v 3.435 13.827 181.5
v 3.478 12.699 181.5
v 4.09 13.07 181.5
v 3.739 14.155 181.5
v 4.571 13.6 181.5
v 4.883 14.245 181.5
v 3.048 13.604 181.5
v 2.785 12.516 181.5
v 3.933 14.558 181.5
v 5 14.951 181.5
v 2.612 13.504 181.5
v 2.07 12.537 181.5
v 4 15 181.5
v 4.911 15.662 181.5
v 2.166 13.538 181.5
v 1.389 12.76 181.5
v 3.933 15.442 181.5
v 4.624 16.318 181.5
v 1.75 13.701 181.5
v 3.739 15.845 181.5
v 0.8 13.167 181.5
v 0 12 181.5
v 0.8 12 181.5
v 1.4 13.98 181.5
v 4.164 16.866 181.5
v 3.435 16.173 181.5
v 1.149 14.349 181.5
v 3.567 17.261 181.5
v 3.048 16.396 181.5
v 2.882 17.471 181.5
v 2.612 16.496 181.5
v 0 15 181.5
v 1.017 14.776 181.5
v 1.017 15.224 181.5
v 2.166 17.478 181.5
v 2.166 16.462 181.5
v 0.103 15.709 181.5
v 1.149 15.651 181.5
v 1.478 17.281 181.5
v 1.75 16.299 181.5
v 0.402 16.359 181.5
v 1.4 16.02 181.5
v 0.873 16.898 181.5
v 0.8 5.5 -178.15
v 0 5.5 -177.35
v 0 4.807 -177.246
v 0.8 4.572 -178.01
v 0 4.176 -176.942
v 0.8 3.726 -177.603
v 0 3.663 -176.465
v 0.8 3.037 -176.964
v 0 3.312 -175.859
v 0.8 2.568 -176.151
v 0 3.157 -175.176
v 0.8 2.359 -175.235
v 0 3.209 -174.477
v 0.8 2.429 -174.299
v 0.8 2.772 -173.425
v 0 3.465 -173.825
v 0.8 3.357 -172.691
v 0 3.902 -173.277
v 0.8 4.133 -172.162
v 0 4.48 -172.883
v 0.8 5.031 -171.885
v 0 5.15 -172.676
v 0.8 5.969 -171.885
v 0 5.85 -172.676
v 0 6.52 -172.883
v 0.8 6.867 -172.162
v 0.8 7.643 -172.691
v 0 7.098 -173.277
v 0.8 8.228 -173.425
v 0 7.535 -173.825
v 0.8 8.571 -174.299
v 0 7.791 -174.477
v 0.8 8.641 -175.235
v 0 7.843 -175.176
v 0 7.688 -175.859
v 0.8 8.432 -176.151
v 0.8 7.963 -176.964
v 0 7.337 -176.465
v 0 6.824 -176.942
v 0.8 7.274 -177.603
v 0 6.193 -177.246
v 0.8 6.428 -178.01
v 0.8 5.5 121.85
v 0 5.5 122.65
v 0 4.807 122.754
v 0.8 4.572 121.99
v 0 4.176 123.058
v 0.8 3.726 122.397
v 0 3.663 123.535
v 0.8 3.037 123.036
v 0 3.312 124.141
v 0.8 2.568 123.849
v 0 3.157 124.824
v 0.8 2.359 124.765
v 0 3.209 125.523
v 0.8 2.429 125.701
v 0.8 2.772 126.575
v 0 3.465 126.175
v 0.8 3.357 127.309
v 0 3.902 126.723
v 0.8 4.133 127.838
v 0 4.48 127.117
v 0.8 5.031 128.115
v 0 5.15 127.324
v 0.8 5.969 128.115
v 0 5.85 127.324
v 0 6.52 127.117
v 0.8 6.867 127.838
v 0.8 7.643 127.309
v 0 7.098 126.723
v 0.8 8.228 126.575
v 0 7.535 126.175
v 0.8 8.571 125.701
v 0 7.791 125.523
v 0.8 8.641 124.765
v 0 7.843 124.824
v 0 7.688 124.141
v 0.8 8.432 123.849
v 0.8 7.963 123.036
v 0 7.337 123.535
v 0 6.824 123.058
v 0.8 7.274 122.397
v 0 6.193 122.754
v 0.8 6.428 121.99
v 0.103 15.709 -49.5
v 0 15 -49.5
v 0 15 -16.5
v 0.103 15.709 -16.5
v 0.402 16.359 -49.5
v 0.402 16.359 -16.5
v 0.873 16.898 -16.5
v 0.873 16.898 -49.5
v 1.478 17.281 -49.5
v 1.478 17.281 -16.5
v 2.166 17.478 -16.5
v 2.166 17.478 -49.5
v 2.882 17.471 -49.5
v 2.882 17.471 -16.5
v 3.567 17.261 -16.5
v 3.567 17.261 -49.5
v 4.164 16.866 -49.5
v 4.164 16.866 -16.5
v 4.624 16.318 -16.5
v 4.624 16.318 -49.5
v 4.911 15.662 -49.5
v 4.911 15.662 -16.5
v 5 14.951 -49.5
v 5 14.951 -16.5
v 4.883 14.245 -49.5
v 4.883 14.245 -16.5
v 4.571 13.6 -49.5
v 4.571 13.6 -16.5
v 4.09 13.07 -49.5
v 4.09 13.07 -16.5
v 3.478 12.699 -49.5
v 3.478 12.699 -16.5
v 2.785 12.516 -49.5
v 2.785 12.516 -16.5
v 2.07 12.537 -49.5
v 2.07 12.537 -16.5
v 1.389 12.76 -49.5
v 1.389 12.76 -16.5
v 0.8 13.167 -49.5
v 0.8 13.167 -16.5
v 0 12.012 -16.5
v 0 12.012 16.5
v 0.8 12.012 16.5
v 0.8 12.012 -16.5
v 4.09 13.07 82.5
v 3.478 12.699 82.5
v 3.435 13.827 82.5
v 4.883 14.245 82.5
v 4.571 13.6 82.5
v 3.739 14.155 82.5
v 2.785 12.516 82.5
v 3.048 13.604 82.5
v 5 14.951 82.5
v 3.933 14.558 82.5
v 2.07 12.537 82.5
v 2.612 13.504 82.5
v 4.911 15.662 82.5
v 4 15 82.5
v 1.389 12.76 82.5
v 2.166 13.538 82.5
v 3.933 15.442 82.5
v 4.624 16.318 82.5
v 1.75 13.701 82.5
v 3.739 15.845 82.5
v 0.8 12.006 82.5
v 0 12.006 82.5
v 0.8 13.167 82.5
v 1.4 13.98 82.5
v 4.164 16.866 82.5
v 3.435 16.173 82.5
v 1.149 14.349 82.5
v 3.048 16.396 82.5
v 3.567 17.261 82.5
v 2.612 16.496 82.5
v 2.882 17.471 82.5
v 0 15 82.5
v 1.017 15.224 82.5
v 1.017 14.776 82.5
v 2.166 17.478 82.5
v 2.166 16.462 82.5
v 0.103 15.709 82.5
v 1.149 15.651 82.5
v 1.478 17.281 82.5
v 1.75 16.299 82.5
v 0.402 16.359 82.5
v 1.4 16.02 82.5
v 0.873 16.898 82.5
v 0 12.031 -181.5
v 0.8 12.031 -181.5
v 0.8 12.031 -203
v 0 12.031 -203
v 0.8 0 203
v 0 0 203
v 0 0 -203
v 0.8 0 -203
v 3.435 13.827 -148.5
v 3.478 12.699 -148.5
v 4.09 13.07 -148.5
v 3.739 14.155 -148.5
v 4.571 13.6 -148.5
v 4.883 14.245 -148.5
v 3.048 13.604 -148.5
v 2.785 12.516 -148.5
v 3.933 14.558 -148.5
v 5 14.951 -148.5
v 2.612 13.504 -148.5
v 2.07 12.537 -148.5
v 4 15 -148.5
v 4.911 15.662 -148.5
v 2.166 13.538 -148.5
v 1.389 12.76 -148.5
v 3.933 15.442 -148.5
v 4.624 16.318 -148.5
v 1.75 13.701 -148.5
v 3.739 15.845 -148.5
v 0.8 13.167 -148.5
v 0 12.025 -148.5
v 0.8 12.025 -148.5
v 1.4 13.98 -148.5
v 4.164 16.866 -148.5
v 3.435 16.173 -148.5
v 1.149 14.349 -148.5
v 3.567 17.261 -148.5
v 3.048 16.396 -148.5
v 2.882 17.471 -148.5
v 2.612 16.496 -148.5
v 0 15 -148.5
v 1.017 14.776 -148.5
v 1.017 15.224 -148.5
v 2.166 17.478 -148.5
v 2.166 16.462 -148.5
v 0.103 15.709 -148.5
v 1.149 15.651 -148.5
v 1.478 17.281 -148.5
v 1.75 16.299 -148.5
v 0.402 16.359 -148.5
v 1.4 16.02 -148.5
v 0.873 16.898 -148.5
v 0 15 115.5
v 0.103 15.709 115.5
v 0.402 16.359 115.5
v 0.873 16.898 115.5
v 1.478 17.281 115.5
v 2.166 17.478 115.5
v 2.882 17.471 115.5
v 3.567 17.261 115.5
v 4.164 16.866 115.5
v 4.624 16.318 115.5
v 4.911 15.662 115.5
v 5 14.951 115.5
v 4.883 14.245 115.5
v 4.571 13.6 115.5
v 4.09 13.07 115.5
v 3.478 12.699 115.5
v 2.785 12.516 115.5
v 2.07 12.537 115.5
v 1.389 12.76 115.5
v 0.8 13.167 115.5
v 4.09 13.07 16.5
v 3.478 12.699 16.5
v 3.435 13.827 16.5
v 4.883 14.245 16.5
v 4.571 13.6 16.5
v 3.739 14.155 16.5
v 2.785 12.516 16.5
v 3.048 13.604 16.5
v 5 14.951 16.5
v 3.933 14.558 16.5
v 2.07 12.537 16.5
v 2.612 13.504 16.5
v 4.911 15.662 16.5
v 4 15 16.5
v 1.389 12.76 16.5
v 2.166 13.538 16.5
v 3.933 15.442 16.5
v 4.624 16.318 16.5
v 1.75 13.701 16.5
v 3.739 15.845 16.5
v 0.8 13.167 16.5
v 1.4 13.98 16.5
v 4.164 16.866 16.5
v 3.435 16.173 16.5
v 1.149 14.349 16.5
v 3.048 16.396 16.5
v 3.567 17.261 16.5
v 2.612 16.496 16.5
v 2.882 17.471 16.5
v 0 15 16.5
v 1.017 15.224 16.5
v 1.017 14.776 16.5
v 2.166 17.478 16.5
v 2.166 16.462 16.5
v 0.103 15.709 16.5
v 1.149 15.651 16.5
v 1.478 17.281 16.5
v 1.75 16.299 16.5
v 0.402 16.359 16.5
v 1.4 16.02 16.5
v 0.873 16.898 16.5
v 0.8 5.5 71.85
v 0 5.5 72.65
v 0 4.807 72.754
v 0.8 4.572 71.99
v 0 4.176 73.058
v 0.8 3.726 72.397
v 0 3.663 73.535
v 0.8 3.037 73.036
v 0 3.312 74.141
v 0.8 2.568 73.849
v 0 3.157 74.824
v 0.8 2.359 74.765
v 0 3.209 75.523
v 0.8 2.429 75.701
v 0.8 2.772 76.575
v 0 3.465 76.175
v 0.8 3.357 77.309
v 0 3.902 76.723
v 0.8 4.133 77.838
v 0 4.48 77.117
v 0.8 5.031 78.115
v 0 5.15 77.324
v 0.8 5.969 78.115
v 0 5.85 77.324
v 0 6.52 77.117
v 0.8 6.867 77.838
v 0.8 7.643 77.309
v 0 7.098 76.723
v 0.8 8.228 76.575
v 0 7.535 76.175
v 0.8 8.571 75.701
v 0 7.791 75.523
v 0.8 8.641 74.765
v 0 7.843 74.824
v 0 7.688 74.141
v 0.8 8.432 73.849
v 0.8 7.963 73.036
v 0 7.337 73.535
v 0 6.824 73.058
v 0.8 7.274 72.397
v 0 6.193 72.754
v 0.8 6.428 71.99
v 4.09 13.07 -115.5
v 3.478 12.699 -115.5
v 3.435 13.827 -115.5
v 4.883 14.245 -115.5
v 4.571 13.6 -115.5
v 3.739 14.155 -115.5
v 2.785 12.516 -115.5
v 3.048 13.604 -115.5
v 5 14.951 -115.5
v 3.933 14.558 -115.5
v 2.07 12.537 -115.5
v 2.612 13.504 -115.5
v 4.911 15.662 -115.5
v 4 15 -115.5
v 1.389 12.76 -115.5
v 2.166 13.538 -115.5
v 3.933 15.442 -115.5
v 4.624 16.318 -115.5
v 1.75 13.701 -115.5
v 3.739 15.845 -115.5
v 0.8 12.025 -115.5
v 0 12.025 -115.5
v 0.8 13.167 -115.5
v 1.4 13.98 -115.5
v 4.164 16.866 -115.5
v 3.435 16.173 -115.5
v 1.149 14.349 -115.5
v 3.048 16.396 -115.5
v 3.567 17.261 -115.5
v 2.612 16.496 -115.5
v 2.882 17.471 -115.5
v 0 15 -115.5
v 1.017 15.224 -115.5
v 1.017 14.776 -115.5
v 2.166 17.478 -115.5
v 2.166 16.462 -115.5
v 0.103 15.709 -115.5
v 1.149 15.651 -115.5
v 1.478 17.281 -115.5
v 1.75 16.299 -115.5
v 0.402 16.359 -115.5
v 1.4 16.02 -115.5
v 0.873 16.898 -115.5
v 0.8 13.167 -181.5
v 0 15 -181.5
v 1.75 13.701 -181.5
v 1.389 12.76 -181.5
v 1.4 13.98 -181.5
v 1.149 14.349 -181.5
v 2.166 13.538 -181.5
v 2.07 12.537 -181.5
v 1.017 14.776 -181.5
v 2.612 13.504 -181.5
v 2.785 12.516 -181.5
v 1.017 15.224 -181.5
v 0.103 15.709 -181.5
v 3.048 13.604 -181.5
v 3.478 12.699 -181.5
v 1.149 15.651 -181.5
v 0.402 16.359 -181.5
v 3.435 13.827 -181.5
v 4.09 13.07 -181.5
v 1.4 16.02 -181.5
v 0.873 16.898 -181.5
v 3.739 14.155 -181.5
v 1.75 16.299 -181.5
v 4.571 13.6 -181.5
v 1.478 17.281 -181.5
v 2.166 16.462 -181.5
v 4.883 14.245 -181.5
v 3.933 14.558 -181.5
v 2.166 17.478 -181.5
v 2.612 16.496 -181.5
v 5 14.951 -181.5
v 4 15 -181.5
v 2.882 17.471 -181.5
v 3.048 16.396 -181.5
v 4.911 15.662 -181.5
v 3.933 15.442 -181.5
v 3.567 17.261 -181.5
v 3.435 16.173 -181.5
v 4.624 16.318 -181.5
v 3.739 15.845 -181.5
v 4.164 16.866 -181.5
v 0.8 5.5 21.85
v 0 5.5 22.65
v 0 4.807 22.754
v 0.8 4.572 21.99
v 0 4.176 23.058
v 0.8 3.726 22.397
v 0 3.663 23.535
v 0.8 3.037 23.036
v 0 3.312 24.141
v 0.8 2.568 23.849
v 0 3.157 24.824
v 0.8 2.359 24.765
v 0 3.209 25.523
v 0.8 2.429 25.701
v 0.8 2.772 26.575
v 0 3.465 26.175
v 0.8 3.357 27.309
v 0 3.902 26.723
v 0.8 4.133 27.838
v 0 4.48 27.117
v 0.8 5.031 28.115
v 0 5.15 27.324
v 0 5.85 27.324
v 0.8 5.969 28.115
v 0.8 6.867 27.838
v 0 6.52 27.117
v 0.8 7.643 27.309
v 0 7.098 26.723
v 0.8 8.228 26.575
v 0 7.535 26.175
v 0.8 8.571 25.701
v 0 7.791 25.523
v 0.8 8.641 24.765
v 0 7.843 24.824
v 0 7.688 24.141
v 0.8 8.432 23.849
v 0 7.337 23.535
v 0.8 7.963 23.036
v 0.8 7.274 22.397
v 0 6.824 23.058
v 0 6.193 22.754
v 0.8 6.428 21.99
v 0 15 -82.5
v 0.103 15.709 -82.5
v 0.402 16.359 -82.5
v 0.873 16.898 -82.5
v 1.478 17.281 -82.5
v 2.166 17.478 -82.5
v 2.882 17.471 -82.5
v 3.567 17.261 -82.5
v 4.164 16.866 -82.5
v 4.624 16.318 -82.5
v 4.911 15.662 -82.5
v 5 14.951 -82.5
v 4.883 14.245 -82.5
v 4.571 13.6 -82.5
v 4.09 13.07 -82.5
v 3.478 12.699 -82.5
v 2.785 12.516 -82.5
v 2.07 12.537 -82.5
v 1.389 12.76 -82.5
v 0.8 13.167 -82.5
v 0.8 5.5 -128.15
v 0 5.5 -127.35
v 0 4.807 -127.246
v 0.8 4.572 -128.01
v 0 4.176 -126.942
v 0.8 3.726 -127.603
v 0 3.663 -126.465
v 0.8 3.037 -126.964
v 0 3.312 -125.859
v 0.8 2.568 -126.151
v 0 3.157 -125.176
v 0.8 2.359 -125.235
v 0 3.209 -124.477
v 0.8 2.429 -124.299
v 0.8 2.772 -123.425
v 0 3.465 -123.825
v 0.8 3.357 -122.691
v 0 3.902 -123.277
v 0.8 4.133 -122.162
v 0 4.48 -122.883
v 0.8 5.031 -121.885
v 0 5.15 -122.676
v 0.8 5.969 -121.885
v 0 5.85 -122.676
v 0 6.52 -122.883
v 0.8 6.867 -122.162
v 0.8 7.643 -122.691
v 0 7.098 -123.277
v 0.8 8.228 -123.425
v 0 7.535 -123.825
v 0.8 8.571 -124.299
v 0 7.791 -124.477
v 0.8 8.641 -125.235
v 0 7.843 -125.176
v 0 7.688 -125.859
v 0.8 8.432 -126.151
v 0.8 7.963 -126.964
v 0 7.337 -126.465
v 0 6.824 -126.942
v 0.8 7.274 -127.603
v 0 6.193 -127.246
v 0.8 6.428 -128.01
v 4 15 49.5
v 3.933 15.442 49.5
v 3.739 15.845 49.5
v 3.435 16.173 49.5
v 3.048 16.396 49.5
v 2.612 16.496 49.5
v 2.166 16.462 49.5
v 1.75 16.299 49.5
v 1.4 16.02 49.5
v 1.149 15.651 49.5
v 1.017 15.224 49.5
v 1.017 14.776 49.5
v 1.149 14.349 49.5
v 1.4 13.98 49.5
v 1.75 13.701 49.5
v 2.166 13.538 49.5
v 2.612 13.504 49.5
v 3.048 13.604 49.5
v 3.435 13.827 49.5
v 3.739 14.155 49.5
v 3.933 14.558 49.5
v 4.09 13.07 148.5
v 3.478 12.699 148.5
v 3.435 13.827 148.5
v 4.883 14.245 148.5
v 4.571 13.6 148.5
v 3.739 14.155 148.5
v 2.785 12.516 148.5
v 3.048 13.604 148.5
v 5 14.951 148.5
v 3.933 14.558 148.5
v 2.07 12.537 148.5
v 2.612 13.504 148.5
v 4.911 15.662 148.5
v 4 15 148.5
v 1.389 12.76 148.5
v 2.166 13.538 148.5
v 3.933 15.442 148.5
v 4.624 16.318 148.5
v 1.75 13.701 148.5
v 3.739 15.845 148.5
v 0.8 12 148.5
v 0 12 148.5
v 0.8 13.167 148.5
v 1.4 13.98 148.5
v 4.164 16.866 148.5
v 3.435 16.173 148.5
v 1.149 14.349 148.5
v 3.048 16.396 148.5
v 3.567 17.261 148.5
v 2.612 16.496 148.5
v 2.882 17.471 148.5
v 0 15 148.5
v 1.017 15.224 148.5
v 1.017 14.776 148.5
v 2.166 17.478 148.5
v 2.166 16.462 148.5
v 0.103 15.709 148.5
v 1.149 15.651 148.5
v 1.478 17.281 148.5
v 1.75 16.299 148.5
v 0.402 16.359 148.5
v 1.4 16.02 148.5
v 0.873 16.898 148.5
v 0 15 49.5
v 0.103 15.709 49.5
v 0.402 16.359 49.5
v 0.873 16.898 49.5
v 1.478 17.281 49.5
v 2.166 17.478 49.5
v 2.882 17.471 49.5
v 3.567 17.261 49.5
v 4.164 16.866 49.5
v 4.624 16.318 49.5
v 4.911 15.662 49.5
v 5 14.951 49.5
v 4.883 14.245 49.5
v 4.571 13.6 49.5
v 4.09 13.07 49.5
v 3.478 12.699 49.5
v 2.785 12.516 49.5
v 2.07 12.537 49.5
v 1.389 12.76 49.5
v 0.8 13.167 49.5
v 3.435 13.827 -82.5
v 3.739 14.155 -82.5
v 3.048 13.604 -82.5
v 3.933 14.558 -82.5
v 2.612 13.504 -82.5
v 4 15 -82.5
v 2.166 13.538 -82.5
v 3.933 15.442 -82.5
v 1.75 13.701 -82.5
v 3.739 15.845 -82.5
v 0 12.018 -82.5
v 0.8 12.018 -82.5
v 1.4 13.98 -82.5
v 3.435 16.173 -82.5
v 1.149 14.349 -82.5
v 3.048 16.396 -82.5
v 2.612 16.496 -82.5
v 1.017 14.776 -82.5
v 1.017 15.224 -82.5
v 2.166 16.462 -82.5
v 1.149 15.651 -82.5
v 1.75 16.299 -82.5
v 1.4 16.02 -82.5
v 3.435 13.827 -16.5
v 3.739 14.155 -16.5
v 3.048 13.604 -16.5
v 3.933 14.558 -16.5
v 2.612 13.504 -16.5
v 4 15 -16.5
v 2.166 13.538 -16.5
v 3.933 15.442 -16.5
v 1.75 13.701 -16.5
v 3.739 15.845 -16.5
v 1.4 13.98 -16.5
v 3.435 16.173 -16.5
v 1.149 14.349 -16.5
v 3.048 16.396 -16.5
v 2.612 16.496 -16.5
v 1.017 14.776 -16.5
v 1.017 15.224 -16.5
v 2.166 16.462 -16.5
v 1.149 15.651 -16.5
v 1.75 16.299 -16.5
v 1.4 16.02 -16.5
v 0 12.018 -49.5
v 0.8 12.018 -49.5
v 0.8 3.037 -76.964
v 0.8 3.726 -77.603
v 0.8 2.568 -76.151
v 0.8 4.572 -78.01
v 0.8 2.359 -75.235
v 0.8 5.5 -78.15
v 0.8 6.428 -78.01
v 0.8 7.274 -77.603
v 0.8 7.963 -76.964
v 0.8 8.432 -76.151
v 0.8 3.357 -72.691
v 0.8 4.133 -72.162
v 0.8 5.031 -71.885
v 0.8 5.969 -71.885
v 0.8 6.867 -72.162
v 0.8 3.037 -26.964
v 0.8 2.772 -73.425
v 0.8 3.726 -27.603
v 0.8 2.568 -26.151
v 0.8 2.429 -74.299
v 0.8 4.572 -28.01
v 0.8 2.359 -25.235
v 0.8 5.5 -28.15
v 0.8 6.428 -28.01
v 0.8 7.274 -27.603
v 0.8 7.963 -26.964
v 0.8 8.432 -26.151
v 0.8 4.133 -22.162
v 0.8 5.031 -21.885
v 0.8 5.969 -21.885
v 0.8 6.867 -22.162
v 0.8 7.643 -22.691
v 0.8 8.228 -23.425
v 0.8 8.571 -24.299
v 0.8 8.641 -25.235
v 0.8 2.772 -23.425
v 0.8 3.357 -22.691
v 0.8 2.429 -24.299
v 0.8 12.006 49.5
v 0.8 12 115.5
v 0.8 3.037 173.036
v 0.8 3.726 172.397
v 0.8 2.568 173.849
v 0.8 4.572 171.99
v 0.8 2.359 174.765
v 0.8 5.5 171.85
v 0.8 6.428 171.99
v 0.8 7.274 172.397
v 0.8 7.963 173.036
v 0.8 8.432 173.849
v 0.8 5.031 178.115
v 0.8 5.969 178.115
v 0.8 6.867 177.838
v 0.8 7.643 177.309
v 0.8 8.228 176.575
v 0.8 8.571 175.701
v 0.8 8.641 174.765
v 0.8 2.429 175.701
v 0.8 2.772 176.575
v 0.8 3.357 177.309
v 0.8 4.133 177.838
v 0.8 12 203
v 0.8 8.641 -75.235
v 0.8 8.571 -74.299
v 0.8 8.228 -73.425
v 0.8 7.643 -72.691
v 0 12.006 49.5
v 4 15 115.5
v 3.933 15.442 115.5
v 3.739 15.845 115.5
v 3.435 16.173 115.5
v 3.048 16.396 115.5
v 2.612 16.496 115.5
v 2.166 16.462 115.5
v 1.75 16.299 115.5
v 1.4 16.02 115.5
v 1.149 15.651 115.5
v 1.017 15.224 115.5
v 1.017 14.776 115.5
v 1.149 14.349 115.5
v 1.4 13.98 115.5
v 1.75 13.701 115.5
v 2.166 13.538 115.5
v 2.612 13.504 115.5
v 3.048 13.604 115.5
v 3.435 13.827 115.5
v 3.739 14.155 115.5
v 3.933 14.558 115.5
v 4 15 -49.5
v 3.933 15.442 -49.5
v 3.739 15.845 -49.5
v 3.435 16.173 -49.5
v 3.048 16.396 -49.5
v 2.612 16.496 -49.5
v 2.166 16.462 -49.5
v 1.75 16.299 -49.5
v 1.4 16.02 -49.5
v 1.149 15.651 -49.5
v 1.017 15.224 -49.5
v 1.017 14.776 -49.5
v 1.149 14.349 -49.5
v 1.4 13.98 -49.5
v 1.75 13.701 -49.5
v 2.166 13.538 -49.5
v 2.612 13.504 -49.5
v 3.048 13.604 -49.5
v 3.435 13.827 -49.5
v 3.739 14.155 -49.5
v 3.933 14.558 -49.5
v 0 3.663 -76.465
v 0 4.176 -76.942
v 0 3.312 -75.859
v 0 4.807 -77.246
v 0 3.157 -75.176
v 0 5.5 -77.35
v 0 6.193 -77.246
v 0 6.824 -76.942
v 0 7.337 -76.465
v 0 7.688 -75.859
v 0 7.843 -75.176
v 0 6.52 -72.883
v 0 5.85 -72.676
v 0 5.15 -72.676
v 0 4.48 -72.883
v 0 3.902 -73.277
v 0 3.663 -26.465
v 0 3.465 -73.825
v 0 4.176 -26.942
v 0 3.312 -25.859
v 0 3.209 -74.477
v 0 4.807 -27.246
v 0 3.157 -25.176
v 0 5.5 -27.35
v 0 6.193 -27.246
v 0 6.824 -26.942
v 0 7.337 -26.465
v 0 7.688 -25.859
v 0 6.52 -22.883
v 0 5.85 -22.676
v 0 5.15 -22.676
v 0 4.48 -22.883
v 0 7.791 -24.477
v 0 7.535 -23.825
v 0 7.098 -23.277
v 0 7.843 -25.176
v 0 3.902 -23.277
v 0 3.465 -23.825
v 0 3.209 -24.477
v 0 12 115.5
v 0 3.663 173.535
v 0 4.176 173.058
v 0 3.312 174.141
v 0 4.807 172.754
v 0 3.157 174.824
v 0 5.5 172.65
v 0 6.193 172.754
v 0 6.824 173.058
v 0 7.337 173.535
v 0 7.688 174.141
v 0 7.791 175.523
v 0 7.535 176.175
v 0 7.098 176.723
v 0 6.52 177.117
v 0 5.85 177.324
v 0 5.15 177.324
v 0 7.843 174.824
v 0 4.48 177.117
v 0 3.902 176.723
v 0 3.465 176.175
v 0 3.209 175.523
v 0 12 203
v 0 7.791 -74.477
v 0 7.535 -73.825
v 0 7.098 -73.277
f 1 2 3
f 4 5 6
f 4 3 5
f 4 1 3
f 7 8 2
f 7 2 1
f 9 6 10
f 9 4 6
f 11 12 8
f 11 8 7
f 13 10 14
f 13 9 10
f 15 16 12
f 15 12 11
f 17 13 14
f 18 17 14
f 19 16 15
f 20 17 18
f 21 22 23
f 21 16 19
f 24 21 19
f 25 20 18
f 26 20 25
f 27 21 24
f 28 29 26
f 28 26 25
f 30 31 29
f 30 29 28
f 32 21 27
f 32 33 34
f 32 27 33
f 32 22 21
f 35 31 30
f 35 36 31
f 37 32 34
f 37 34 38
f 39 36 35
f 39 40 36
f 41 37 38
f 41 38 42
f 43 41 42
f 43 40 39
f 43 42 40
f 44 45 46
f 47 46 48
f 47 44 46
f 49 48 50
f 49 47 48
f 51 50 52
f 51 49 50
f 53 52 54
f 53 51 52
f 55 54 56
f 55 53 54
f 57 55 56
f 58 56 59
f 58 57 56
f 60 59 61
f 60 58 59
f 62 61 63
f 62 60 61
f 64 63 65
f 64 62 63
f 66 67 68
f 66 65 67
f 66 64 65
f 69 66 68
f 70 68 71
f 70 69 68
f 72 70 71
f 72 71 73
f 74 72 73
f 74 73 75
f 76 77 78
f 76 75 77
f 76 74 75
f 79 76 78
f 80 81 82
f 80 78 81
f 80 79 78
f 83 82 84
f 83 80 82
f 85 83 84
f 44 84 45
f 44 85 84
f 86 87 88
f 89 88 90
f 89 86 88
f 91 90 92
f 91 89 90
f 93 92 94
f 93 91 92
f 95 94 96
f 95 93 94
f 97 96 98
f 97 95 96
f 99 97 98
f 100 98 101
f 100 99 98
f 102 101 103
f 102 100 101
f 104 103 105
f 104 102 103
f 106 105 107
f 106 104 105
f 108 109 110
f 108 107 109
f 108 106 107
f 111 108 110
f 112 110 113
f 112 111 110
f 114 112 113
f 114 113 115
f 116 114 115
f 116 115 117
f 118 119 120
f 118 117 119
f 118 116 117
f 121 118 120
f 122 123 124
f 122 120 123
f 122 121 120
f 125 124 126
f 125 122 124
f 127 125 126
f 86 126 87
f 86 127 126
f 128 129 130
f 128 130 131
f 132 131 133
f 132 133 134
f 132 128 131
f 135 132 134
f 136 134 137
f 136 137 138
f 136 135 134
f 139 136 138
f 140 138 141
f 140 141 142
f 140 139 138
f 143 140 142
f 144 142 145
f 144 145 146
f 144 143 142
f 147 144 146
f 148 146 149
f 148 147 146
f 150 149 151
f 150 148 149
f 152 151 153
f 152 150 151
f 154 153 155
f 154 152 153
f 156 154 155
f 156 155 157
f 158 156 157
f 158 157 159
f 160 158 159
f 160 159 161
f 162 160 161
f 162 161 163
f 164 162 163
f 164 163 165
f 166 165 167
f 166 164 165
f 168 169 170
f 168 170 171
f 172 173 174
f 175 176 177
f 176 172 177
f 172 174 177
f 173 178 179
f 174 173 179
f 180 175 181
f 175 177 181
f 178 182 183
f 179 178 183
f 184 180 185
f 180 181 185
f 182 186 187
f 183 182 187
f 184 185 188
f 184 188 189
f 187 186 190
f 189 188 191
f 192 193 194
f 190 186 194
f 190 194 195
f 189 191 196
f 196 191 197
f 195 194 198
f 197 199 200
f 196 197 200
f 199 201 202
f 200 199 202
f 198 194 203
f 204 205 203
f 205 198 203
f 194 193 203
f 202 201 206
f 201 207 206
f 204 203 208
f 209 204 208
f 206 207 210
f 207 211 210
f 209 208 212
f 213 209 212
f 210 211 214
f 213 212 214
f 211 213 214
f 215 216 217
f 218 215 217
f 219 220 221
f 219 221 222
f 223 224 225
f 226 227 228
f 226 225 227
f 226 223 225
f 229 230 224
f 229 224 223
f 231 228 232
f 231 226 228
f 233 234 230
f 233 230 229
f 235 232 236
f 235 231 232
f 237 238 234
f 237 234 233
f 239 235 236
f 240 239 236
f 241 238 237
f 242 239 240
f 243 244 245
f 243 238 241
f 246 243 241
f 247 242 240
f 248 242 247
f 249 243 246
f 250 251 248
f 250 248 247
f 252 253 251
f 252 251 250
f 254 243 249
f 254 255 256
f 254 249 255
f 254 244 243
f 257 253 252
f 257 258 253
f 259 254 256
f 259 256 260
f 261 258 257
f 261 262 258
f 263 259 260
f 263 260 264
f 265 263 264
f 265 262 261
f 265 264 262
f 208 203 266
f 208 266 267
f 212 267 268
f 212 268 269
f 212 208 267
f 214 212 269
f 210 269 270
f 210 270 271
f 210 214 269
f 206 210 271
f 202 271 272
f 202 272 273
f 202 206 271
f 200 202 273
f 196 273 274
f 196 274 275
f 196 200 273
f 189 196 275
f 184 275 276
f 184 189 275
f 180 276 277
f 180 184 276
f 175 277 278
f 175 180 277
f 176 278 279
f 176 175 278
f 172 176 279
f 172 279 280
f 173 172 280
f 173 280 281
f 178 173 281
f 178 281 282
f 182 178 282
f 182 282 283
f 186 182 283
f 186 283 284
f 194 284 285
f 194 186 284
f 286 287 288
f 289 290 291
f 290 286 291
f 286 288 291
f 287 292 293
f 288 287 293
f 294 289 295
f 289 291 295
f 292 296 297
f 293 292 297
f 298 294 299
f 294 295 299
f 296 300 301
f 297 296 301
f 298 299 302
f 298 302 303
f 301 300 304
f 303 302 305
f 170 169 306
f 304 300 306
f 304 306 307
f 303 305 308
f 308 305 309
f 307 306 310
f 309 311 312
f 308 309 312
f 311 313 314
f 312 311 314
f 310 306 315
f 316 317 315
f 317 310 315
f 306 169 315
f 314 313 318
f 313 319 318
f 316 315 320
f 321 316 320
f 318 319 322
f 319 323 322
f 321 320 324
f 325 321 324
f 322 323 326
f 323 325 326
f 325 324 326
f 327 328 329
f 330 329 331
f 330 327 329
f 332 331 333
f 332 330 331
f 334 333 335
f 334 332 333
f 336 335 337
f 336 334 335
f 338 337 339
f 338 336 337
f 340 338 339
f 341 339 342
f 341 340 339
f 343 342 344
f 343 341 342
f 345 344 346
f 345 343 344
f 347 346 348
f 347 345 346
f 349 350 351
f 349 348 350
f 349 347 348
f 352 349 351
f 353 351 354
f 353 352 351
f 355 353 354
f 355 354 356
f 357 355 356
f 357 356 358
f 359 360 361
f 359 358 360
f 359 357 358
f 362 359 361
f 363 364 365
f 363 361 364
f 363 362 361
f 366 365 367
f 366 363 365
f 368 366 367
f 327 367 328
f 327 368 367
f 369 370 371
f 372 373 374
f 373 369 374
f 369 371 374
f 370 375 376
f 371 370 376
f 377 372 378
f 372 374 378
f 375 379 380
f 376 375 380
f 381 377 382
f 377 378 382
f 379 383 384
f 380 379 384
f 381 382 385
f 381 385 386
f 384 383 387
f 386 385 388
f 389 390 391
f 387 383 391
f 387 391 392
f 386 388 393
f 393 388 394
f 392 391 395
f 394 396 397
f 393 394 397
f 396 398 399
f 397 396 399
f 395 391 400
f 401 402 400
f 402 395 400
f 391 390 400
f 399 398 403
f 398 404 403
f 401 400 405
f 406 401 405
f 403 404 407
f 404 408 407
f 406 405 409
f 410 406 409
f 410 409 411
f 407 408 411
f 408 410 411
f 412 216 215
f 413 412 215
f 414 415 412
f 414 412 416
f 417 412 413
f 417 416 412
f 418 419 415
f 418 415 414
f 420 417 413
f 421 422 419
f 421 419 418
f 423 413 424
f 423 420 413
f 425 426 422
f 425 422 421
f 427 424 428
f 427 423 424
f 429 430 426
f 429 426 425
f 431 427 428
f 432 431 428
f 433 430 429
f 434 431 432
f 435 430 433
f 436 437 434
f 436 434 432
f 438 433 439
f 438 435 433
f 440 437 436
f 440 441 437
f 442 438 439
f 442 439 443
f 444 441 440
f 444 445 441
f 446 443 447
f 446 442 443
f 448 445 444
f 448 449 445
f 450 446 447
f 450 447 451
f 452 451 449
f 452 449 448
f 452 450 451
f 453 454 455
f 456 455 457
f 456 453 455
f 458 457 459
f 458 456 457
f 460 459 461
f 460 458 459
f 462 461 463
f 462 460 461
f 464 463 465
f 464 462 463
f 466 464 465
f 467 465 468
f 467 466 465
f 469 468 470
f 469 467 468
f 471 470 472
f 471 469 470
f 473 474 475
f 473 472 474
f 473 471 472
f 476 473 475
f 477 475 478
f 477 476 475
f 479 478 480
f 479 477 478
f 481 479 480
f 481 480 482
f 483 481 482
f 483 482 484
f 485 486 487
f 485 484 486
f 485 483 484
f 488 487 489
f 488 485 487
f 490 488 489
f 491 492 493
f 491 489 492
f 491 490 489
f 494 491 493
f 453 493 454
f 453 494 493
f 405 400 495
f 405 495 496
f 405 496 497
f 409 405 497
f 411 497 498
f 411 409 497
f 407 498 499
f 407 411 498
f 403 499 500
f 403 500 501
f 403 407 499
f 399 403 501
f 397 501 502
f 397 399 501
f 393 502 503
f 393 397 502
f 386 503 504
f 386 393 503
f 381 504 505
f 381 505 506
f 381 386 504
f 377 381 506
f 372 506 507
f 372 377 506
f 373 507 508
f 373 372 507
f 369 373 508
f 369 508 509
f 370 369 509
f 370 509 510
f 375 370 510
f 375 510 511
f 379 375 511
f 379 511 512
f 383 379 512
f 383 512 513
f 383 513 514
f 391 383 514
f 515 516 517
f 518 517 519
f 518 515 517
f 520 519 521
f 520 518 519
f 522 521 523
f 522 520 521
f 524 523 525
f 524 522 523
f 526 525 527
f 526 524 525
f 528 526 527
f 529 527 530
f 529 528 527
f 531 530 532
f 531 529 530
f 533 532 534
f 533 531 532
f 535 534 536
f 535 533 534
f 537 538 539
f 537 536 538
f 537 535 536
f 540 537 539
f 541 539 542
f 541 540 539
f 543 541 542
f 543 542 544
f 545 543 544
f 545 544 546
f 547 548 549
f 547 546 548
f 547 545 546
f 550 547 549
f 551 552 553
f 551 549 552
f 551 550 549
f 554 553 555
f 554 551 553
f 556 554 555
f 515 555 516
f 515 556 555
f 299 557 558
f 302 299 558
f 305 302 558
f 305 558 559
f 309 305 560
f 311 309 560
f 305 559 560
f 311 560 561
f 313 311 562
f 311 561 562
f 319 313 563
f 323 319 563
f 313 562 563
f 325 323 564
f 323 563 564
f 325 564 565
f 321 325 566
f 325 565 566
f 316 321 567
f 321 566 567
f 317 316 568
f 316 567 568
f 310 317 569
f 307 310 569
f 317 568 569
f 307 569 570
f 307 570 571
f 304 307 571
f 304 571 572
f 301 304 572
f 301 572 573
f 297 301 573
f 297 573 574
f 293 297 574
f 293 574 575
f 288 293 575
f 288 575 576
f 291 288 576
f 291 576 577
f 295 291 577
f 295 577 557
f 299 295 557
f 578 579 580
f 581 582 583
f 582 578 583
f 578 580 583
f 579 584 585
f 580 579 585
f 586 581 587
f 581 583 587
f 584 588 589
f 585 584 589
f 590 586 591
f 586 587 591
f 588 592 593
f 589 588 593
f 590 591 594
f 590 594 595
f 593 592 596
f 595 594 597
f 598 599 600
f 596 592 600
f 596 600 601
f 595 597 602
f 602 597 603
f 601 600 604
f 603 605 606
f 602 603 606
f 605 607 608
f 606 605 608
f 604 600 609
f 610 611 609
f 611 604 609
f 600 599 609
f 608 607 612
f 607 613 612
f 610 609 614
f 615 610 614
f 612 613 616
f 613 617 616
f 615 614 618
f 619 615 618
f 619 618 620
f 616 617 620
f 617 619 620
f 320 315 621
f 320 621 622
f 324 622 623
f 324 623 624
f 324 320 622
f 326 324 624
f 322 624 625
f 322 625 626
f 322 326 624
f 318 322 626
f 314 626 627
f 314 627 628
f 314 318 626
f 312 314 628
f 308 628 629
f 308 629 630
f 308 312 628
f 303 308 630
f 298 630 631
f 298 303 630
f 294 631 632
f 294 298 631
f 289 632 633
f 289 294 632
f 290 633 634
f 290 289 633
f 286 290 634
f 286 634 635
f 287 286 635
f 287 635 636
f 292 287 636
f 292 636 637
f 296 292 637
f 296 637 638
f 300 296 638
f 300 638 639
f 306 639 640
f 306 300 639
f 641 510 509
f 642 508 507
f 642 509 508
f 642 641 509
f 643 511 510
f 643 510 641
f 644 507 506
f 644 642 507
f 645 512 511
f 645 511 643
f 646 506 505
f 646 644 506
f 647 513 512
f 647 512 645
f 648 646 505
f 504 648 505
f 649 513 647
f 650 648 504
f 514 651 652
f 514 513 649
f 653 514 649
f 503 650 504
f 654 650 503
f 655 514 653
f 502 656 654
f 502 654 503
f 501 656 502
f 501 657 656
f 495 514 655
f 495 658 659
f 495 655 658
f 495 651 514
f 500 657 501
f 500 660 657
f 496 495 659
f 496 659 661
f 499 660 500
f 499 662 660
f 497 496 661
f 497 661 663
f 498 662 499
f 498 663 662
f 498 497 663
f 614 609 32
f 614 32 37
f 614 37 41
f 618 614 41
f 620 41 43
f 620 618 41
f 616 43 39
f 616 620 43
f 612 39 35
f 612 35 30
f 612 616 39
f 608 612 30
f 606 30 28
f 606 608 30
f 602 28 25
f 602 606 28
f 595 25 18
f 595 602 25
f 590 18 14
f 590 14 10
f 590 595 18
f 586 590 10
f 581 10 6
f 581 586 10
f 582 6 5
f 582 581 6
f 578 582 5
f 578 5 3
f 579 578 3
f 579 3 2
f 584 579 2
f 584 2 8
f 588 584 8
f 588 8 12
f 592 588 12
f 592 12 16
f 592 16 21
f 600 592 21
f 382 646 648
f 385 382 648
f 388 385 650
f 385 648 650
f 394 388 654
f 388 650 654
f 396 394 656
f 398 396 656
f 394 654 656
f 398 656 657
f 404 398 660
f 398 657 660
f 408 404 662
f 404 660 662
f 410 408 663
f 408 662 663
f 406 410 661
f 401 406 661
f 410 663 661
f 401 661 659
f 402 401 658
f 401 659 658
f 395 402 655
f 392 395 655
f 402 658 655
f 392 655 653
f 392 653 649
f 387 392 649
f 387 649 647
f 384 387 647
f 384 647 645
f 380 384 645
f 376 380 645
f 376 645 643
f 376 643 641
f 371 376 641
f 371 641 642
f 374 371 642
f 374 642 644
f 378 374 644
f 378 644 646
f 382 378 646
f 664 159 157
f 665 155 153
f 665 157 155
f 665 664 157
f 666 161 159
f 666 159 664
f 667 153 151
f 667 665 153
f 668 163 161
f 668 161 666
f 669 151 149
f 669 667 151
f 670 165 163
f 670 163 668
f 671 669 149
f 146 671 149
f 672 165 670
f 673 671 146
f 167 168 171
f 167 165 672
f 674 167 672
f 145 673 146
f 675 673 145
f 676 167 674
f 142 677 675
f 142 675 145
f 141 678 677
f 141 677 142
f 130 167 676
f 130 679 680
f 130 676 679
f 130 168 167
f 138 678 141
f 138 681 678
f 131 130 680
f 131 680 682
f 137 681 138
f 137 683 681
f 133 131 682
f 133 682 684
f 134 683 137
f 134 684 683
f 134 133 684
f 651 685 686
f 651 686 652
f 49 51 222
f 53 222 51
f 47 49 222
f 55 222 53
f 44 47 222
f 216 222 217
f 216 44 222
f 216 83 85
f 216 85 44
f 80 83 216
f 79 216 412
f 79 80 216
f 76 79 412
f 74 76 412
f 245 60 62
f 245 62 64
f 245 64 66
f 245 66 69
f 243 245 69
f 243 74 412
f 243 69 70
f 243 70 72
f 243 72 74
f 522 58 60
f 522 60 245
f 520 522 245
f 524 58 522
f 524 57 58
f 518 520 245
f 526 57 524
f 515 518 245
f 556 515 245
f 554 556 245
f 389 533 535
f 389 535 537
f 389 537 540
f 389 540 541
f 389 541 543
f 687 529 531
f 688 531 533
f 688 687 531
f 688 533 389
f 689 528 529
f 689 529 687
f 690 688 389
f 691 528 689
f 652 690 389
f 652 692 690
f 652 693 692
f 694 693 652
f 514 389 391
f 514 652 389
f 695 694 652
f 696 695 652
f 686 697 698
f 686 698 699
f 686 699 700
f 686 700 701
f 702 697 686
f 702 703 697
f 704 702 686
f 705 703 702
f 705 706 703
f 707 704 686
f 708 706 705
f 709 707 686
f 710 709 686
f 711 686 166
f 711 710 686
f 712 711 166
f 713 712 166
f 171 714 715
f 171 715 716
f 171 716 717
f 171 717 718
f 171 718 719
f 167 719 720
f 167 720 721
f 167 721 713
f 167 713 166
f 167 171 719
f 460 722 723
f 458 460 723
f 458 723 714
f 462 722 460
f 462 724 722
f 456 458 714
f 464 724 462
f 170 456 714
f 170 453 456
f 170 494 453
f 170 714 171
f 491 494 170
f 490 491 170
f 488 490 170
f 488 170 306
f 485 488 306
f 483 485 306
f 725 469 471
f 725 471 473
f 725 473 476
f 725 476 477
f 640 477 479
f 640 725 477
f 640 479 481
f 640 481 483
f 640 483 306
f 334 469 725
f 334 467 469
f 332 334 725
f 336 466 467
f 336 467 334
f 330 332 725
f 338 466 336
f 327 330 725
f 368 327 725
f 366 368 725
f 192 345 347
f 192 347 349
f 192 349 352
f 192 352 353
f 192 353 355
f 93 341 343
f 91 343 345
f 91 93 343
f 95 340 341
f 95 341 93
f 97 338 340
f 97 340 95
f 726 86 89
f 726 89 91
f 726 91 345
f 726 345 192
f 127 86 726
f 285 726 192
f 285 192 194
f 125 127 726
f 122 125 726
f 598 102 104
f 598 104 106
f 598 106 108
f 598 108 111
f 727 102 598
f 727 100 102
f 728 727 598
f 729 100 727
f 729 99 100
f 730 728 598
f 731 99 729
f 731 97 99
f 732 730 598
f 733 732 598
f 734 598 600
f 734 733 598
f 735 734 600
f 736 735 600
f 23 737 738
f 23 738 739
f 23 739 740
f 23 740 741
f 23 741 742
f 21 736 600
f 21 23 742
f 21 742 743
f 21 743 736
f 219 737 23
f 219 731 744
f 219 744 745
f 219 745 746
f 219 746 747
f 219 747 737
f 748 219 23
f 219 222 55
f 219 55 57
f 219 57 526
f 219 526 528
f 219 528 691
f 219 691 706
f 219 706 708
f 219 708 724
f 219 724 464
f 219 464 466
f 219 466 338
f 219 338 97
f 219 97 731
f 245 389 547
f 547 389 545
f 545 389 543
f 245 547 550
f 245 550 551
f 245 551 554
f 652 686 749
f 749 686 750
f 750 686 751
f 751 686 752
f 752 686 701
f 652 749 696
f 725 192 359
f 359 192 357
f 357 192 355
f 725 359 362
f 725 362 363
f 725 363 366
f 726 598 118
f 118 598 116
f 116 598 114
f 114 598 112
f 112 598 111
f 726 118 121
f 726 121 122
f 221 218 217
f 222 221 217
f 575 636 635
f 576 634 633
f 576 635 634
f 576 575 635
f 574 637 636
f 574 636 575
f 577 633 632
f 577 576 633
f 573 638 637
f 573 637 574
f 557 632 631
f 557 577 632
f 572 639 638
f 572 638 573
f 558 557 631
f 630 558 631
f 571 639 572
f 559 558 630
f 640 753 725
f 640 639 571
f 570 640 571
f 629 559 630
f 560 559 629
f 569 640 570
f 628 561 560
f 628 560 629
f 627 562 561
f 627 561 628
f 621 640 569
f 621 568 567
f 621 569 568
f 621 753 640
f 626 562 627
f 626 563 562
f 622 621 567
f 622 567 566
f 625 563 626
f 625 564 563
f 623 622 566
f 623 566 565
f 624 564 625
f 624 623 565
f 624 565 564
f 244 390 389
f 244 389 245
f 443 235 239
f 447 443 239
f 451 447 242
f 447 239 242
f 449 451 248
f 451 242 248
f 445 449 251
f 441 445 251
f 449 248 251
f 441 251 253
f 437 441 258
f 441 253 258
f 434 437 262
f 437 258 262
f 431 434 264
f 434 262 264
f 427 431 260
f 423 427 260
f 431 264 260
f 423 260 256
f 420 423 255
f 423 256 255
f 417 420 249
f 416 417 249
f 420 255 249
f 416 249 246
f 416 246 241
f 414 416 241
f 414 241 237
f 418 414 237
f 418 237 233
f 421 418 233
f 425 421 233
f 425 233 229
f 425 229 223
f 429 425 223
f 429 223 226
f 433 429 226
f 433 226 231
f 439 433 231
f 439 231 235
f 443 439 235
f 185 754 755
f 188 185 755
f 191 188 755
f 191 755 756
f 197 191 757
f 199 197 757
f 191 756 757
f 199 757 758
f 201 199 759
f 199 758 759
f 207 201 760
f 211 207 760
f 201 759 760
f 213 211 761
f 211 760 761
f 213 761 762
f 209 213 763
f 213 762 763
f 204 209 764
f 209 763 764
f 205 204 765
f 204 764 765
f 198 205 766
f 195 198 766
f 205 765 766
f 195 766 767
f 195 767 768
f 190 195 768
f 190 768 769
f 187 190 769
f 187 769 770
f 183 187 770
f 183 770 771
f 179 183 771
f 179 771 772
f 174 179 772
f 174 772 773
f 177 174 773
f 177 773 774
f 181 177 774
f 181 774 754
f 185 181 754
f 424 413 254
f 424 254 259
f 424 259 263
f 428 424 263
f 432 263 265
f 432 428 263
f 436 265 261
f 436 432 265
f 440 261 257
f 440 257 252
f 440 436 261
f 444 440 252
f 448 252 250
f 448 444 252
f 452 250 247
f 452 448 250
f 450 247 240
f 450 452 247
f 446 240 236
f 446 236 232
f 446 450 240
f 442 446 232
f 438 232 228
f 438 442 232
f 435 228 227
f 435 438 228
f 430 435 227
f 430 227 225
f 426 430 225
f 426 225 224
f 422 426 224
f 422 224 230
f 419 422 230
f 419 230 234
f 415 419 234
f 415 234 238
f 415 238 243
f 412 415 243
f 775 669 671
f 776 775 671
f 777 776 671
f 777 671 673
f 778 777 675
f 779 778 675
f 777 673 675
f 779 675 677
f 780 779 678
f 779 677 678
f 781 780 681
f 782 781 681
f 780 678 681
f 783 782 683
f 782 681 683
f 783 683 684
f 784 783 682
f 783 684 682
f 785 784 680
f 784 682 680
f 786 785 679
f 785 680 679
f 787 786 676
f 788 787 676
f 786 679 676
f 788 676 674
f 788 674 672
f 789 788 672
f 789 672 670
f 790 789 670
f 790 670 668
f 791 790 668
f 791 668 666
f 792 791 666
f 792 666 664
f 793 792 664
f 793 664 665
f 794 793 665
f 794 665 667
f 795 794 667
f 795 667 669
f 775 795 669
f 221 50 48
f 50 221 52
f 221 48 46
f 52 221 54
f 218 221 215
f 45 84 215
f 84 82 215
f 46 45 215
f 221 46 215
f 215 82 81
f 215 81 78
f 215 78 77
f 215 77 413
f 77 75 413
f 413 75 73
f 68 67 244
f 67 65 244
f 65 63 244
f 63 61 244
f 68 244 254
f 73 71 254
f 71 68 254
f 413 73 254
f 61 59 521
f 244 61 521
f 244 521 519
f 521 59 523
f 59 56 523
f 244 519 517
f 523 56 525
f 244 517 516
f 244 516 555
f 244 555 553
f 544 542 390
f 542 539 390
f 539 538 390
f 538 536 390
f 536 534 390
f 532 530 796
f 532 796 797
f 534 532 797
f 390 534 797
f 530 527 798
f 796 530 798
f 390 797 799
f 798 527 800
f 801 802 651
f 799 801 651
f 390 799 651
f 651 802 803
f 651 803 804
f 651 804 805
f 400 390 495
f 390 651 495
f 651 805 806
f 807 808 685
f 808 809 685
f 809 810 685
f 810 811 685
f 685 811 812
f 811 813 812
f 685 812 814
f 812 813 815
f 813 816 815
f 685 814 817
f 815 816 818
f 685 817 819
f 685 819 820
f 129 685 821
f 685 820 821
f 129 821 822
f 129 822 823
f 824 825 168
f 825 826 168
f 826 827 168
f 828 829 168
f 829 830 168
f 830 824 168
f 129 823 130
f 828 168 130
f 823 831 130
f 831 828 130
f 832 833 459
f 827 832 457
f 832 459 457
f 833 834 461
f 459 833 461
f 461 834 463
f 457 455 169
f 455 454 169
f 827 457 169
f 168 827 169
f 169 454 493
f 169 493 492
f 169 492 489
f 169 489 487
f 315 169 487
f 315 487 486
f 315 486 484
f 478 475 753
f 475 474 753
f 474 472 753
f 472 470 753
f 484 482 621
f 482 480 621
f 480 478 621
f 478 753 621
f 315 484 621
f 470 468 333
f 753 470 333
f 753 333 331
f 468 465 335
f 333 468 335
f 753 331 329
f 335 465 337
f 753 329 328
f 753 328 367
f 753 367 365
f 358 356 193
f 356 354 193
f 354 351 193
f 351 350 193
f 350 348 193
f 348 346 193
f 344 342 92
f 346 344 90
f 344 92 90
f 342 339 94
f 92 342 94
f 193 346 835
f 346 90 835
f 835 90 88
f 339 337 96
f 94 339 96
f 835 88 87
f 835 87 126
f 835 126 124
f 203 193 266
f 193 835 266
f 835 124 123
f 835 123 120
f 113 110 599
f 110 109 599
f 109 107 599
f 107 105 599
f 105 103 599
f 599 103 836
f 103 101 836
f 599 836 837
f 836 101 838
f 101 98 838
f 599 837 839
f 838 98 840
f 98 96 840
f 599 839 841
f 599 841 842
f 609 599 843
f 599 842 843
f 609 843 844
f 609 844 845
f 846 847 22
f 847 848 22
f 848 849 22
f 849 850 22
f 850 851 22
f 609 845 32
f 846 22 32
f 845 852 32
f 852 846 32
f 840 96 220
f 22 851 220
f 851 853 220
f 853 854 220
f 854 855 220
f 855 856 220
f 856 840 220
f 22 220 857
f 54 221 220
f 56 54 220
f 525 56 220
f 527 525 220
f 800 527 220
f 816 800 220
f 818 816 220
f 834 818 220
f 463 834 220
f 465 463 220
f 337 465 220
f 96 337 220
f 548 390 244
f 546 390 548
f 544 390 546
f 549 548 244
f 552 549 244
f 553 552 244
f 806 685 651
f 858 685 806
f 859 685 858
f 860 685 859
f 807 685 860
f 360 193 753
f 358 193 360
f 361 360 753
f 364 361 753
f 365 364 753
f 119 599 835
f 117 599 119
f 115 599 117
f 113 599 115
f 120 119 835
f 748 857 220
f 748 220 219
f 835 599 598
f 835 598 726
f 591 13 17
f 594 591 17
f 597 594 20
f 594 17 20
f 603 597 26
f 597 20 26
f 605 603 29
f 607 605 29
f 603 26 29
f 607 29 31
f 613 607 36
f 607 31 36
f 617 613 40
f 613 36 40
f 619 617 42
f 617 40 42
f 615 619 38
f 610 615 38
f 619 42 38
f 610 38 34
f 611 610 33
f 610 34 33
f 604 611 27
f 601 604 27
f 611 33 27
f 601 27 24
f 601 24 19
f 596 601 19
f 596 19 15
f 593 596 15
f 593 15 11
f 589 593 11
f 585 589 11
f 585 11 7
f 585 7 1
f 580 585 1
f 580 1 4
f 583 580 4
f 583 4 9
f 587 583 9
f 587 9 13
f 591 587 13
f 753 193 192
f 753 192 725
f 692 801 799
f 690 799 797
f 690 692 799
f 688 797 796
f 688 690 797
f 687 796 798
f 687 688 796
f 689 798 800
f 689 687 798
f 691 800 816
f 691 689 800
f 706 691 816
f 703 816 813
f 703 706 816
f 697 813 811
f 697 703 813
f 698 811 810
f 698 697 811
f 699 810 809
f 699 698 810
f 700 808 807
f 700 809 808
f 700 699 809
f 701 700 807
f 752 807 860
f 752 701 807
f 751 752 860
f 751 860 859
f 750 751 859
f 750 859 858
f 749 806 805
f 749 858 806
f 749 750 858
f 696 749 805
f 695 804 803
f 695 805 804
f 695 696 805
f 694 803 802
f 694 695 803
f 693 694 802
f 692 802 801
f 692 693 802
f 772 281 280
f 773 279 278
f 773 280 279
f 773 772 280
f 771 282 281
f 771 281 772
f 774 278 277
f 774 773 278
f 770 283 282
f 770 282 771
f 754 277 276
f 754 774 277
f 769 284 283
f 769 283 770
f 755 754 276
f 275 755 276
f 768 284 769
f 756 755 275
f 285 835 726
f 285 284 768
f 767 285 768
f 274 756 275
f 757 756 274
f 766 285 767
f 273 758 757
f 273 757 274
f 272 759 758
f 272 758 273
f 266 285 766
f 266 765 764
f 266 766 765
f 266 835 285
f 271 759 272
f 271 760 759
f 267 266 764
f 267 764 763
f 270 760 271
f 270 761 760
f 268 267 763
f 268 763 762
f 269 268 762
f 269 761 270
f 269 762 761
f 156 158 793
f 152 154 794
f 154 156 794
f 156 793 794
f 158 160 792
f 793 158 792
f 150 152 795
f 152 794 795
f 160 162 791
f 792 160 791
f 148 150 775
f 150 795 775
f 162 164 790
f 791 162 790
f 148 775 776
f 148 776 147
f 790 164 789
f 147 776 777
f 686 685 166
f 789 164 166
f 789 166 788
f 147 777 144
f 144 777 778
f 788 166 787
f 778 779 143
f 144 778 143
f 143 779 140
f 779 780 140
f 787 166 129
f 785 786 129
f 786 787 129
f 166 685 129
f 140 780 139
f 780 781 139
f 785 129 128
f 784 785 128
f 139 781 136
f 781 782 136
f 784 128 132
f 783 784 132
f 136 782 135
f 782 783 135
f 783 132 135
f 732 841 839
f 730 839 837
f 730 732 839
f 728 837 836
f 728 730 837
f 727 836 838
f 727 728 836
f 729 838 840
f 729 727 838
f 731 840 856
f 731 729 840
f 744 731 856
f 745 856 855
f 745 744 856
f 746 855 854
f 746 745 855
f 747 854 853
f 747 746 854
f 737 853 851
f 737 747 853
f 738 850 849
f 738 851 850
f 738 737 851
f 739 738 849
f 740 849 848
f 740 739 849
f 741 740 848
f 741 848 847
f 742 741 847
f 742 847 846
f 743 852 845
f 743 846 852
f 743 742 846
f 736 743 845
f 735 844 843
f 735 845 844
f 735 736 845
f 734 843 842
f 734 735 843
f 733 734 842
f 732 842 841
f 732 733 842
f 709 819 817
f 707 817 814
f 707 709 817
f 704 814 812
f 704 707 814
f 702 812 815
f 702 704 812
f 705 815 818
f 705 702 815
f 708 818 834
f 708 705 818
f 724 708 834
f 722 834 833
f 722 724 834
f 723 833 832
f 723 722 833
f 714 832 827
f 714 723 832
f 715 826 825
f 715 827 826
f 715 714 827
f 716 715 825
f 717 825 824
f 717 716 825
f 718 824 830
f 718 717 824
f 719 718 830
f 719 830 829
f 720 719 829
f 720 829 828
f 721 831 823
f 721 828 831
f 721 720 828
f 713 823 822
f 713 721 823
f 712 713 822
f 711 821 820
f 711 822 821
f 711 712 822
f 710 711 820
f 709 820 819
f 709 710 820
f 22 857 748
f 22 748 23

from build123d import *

# Parameters (mm, degrees)
SKETCH_1_W             = 0.8
SKETCH_1_H             = 15
EXTRUDE_1_DEPTH        = 203
SKETCH_2_R             = 2.5
SKETCH_3_R             = 1.5
CUT_EXTRUDE_1_DEPTH    = 407.407738607
SKETCH_10_W            = 33
SKETCH_10_H            = 6
SKETCH_10_W_2          = 21.5
CUT_EXTRUDE_4_DEPTH    = 60
PATTERN_LINEAR_1_COUNT = 8
PATTERN_LINEAR_1_PITCH = 50


with BuildPart() as part:
    # 草图1 → 拉伸-薄壁1 (new, symmetric)
    with BuildSketch(Plane.XY):
        with Locations((0.4, 7.5)):
            Rectangle(SKETCH_1_W, SKETCH_1_H)
    extrude(amount=EXTRUDE_1_DEPTH, both=True)

    # 扫描1: sweep along a curve in space
    with BuildLine() as sweep_1_path:
        Line((0.8, 15, 203), (0.8, 15, -203))
    # 草图2 → 扫描1 (sweep)
    with BuildSketch(Plane.XY.offset(203)):
        with Locations((2.5, 15)):
            Circle(SKETCH_2_R)
    sweep(path=sweep_1_path.line)

    # 草图3 → 切除-拉伸1 (cut, through all)
    with BuildSketch(Plane.XY.offset(203)):
        with Locations((2.5, 15)):
            Circle(SKETCH_3_R)
    extrude(amount=-CUT_EXTRUDE_1_DEPTH, mode=Mode.SUBTRACT)

    # 草图10 → 切除-拉伸4 (cut, symmetric)
    with BuildSketch(Plane(origin=(0.8, 0, 0), x_dir=(0, 0, -1), z_dir=(1, 0, 0))):
        with Locations((-132, 15)):
            Rectangle(SKETCH_10_W, SKETCH_10_H)
        with Locations((-192.25, 15)):
            Rectangle(SKETCH_10_W_2, SKETCH_10_H)
        with Locations((-66, 15.006165986)):
            Rectangle(SKETCH_10_W, SKETCH_10_H)
        with Locations((0, 15.012331973)):
            Rectangle(SKETCH_10_W, SKETCH_10_H)
        with Locations((66, 15.018497959)):
            Rectangle(SKETCH_10_W, SKETCH_10_H)
        with Locations((132, 15.024663945)):
            Rectangle(SKETCH_10_W, SKETCH_10_H)
        with Locations((192.25, 15.030829932)):
            Rectangle(SKETCH_10_W_2, SKETCH_10_H)
    extrude(amount=CUT_EXTRUDE_4_DEPTH, both=True, mode=Mode.SUBTRACT)

    # 草图11 → M3 锥坑平头螺钉的锥形沉头孔1 (revolve, cut)
    with BuildSketch(Plane(origin=(0.8, 5.5, -175), x_dir=(0, 0, -1), z_dir=(0, 1, 0))):
        Polygon((0, 0), (0, 0.8), (1.7, 0.8), (1.7, 1.45), (3.15, 0), align=None)
    hole_wizard_m3_1 = revolve(axis=Axis((7.15, 5.5, -175), (-1, 0, 0)), mode=Mode.SUBTRACT)

    # 阵列(线性)1: M3 锥坑平头螺钉的锥形沉头孔1 ×8
    with Locations(*[(0, 0, i * PATTERN_LINEAR_1_PITCH) for i in range(1, PATTERN_LINEAR_1_COUNT)]):
        add(hole_wizard_m3_1, mode=Mode.SUBTRACT)


solid = part.part
